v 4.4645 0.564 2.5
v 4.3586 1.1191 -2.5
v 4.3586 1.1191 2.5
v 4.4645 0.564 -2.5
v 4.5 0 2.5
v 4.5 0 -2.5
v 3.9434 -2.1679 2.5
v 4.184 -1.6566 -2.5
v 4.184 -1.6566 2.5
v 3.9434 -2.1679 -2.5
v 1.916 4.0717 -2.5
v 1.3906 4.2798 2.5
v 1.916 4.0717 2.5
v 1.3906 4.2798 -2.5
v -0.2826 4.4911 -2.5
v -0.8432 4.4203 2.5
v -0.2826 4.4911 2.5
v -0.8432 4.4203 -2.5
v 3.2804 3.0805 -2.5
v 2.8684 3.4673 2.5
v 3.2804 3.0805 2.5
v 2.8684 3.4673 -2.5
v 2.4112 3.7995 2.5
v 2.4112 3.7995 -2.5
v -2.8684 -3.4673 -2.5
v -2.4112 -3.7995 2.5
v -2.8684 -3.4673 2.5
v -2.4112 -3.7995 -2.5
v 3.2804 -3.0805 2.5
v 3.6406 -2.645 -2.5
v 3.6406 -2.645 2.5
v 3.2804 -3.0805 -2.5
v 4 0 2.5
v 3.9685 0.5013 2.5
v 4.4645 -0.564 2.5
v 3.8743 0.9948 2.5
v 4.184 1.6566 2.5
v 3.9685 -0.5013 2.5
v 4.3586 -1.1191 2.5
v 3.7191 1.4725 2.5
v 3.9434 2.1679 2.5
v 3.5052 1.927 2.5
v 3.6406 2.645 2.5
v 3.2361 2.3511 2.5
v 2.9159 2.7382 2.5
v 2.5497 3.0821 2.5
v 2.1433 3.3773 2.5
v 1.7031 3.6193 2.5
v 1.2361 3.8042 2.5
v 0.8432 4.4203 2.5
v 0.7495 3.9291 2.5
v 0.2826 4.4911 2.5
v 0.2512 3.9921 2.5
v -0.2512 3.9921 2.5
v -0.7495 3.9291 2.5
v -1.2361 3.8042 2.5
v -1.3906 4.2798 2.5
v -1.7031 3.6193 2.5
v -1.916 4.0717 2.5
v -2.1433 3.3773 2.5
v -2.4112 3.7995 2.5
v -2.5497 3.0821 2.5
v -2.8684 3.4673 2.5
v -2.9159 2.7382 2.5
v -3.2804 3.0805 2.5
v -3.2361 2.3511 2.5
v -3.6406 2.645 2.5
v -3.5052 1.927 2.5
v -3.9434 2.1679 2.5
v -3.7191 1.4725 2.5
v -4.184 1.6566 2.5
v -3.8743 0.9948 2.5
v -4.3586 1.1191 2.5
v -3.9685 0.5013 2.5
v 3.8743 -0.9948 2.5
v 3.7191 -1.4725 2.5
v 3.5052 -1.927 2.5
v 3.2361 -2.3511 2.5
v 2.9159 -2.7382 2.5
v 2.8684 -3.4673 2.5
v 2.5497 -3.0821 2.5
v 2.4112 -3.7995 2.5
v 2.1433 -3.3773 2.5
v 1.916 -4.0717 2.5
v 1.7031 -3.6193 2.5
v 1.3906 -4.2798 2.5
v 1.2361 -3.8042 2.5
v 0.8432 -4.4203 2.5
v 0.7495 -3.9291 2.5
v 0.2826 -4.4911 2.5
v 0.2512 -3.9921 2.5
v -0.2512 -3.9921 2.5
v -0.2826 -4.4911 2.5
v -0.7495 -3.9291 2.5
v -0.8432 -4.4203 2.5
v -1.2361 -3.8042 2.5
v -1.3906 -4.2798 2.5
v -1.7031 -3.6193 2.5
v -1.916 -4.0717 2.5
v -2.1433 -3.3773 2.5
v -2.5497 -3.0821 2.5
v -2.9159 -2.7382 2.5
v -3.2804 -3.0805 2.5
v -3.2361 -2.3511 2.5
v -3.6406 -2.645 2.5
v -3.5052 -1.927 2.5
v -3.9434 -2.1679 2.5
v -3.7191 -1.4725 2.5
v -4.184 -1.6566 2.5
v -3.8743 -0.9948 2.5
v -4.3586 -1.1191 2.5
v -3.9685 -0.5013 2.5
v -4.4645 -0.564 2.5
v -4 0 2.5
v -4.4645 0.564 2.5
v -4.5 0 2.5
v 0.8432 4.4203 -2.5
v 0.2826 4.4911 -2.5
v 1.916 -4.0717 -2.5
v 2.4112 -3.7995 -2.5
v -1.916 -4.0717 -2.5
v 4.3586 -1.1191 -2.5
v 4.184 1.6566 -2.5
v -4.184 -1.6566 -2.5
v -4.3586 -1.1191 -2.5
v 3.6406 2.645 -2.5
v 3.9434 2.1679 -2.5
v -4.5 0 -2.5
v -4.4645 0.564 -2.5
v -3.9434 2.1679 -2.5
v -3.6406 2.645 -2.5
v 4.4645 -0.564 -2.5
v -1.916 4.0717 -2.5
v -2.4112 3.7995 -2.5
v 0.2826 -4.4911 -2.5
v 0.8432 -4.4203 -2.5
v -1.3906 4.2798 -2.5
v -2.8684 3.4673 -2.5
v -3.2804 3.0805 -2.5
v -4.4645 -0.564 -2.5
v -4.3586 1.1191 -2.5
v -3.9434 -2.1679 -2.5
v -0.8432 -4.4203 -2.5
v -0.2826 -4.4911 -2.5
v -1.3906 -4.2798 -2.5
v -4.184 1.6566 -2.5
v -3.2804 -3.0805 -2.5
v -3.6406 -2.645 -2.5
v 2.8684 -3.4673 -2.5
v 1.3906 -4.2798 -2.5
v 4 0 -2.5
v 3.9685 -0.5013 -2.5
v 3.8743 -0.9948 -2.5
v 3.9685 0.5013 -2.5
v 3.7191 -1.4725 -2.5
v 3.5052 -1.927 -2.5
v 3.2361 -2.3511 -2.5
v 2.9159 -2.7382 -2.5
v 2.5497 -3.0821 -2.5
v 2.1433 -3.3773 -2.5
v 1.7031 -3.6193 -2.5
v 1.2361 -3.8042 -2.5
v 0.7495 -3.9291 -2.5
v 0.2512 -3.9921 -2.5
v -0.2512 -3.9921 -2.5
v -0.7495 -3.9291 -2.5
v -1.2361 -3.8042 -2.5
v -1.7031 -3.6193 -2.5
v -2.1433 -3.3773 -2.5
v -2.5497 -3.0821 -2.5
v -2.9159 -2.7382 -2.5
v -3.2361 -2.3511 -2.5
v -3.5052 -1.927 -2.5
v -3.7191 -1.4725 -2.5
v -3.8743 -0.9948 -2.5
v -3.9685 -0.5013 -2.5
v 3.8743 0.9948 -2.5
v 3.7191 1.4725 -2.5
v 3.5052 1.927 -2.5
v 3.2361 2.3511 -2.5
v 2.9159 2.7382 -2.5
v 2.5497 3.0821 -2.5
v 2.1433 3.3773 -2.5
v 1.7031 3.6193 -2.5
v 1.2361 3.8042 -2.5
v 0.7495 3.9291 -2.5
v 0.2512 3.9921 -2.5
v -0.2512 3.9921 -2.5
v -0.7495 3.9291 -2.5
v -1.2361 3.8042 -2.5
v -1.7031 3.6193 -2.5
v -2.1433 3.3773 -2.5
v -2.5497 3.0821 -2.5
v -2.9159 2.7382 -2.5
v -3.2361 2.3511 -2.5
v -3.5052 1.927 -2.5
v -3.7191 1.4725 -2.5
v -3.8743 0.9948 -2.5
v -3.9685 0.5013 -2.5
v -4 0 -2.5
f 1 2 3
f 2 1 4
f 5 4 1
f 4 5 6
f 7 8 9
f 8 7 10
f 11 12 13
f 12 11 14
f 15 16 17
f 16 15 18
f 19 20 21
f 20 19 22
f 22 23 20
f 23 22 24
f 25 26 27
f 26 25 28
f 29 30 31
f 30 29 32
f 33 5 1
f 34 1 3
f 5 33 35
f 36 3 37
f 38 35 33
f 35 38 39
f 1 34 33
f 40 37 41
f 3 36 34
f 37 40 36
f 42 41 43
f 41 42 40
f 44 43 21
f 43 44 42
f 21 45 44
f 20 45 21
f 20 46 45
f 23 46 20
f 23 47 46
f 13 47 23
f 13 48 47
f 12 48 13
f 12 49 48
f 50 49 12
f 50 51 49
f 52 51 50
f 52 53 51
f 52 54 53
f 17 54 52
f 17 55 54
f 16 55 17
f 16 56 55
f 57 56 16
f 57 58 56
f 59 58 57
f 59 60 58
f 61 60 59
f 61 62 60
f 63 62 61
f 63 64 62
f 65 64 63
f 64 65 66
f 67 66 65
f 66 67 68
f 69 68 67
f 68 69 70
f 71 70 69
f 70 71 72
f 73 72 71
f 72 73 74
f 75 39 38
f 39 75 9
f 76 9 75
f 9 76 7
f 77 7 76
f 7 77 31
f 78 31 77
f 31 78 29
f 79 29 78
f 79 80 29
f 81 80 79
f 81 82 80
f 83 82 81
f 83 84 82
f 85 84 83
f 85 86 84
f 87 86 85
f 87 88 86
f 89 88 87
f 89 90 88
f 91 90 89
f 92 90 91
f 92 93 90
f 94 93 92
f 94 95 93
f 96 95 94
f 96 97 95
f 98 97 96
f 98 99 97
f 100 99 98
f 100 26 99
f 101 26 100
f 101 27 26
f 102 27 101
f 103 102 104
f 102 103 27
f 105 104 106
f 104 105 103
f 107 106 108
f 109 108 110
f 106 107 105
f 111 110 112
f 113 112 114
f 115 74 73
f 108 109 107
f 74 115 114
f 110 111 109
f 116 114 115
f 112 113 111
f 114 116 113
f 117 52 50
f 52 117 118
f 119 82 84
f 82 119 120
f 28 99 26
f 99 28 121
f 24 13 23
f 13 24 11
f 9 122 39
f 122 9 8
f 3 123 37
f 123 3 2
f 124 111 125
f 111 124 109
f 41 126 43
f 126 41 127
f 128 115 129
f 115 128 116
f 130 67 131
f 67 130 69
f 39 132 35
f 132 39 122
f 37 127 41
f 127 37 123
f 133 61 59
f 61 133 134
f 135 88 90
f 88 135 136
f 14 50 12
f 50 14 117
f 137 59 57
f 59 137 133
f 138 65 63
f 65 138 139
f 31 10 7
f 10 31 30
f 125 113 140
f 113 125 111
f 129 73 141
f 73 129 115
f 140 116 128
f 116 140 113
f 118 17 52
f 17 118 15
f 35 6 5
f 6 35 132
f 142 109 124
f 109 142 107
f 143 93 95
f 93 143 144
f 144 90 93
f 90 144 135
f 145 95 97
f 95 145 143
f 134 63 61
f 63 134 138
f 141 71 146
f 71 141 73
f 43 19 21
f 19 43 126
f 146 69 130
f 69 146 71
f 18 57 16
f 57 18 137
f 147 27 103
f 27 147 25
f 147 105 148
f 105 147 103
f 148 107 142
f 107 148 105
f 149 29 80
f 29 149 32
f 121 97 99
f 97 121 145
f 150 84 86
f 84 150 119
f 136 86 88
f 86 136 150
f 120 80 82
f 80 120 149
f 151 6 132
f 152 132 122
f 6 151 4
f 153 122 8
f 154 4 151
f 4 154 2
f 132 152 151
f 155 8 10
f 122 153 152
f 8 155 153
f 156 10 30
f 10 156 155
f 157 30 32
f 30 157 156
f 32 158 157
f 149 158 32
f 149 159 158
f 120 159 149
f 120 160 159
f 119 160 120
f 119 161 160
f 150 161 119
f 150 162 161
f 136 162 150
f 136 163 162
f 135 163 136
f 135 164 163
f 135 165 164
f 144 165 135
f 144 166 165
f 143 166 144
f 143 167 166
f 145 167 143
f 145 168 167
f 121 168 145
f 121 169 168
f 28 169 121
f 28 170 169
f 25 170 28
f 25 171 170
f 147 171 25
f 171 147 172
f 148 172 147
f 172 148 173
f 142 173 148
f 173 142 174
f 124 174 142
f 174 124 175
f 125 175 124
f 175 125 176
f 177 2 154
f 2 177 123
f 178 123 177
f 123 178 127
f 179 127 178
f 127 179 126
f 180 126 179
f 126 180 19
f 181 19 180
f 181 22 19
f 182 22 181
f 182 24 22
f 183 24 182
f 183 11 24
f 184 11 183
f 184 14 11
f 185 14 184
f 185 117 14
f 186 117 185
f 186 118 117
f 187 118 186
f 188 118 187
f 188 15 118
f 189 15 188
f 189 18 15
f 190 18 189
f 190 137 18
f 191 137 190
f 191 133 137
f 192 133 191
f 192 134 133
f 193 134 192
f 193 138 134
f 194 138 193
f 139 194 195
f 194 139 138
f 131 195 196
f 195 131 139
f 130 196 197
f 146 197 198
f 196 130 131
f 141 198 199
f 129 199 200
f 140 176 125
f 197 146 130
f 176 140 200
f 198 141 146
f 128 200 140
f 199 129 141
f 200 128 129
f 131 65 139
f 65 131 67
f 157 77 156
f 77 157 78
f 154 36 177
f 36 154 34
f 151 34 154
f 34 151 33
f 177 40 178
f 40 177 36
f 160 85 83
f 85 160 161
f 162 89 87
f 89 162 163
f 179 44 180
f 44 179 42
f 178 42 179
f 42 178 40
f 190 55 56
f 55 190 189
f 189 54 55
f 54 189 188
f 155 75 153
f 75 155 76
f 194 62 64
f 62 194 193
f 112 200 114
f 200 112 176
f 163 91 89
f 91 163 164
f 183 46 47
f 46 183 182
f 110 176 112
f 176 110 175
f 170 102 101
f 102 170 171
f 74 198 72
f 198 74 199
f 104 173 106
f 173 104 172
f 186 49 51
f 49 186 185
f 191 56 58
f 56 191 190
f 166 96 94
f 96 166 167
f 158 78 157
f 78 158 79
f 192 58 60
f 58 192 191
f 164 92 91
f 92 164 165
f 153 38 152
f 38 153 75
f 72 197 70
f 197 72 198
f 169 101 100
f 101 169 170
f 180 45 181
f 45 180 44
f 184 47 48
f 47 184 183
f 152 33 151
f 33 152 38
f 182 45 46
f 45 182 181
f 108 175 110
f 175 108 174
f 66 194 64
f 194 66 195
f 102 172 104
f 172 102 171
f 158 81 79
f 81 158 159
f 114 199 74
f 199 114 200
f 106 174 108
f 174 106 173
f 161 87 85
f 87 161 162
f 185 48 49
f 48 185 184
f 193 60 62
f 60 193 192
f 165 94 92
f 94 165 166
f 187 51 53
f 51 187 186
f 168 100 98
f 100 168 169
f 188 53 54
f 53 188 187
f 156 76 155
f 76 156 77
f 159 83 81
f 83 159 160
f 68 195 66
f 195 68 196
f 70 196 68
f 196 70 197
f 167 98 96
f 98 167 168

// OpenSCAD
$fn = 50;


difference() {
	union() {
		translate(v = [0, 0, -2.5000000000]) {
			cylinder(h = 5, r = 4.5000000000);
		}
	}
	union() {
		translate(v = [0, 0, -100.0000000000]) {
			cylinder(h = 200, r = 4.0000000000);
		}
	}
}
